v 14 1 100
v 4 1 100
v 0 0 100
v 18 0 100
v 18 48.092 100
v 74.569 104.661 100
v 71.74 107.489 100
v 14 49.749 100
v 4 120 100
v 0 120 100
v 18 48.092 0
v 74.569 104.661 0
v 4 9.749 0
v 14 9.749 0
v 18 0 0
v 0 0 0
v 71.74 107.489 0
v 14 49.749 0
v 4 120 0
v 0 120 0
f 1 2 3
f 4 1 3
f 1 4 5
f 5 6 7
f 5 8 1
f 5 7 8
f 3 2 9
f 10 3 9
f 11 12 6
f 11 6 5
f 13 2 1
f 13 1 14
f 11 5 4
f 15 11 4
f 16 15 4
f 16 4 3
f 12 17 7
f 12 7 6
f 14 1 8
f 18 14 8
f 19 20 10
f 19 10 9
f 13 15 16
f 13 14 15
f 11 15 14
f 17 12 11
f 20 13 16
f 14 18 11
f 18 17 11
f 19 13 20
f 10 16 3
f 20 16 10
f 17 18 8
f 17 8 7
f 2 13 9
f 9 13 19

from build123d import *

# Parameters (mm, degrees)
SKETCH1_W           = 4
SKETCH1_H           = 120
BOSS_EXTRUDE1_DEPTH = 100
BOSS_EXTRUDE2_DEPTH = 10
BOSS_EXTRUDE3_DEPTH = 100


with BuildPart() as part:
    # Sketch1 → Boss-Extrude1 (new body)
    with BuildSketch(Plane.XY):
        with Locations((2, 60)):
            Rectangle(SKETCH1_W, SKETCH1_H)
    extrude(amount=BOSS_EXTRUDE1_DEPTH)

    # Sketch2 → Boss-Extrude2 (add)
    with BuildSketch(Plane(origin=(4, 0, 0), x_dir=(0, 0, -1), z_dir=(1, 0, 0))):
        Polygon((-100, 0), (-100, 1), (0, 9.748866353), (0, 0), align=None)
    extrude(amount=BOSS_EXTRUDE2_DEPTH)

    # Sketch4 → Boss-Extrude3 (add)
    with BuildSketch(Plane(origin=(0, 0, 0), x_dir=(-1, 0, 0), z_dir=(0, 0, -1))):
        Polygon((-14, 0), (-14, 49.748866353), (-71.74011537, 107.488981723), (-74.568542495, 104.660554598), (-18, 48.092012103), (-18, 0), align=None)
    extrude(amount=-BOSS_EXTRUDE3_DEPTH)


solid = part.part
